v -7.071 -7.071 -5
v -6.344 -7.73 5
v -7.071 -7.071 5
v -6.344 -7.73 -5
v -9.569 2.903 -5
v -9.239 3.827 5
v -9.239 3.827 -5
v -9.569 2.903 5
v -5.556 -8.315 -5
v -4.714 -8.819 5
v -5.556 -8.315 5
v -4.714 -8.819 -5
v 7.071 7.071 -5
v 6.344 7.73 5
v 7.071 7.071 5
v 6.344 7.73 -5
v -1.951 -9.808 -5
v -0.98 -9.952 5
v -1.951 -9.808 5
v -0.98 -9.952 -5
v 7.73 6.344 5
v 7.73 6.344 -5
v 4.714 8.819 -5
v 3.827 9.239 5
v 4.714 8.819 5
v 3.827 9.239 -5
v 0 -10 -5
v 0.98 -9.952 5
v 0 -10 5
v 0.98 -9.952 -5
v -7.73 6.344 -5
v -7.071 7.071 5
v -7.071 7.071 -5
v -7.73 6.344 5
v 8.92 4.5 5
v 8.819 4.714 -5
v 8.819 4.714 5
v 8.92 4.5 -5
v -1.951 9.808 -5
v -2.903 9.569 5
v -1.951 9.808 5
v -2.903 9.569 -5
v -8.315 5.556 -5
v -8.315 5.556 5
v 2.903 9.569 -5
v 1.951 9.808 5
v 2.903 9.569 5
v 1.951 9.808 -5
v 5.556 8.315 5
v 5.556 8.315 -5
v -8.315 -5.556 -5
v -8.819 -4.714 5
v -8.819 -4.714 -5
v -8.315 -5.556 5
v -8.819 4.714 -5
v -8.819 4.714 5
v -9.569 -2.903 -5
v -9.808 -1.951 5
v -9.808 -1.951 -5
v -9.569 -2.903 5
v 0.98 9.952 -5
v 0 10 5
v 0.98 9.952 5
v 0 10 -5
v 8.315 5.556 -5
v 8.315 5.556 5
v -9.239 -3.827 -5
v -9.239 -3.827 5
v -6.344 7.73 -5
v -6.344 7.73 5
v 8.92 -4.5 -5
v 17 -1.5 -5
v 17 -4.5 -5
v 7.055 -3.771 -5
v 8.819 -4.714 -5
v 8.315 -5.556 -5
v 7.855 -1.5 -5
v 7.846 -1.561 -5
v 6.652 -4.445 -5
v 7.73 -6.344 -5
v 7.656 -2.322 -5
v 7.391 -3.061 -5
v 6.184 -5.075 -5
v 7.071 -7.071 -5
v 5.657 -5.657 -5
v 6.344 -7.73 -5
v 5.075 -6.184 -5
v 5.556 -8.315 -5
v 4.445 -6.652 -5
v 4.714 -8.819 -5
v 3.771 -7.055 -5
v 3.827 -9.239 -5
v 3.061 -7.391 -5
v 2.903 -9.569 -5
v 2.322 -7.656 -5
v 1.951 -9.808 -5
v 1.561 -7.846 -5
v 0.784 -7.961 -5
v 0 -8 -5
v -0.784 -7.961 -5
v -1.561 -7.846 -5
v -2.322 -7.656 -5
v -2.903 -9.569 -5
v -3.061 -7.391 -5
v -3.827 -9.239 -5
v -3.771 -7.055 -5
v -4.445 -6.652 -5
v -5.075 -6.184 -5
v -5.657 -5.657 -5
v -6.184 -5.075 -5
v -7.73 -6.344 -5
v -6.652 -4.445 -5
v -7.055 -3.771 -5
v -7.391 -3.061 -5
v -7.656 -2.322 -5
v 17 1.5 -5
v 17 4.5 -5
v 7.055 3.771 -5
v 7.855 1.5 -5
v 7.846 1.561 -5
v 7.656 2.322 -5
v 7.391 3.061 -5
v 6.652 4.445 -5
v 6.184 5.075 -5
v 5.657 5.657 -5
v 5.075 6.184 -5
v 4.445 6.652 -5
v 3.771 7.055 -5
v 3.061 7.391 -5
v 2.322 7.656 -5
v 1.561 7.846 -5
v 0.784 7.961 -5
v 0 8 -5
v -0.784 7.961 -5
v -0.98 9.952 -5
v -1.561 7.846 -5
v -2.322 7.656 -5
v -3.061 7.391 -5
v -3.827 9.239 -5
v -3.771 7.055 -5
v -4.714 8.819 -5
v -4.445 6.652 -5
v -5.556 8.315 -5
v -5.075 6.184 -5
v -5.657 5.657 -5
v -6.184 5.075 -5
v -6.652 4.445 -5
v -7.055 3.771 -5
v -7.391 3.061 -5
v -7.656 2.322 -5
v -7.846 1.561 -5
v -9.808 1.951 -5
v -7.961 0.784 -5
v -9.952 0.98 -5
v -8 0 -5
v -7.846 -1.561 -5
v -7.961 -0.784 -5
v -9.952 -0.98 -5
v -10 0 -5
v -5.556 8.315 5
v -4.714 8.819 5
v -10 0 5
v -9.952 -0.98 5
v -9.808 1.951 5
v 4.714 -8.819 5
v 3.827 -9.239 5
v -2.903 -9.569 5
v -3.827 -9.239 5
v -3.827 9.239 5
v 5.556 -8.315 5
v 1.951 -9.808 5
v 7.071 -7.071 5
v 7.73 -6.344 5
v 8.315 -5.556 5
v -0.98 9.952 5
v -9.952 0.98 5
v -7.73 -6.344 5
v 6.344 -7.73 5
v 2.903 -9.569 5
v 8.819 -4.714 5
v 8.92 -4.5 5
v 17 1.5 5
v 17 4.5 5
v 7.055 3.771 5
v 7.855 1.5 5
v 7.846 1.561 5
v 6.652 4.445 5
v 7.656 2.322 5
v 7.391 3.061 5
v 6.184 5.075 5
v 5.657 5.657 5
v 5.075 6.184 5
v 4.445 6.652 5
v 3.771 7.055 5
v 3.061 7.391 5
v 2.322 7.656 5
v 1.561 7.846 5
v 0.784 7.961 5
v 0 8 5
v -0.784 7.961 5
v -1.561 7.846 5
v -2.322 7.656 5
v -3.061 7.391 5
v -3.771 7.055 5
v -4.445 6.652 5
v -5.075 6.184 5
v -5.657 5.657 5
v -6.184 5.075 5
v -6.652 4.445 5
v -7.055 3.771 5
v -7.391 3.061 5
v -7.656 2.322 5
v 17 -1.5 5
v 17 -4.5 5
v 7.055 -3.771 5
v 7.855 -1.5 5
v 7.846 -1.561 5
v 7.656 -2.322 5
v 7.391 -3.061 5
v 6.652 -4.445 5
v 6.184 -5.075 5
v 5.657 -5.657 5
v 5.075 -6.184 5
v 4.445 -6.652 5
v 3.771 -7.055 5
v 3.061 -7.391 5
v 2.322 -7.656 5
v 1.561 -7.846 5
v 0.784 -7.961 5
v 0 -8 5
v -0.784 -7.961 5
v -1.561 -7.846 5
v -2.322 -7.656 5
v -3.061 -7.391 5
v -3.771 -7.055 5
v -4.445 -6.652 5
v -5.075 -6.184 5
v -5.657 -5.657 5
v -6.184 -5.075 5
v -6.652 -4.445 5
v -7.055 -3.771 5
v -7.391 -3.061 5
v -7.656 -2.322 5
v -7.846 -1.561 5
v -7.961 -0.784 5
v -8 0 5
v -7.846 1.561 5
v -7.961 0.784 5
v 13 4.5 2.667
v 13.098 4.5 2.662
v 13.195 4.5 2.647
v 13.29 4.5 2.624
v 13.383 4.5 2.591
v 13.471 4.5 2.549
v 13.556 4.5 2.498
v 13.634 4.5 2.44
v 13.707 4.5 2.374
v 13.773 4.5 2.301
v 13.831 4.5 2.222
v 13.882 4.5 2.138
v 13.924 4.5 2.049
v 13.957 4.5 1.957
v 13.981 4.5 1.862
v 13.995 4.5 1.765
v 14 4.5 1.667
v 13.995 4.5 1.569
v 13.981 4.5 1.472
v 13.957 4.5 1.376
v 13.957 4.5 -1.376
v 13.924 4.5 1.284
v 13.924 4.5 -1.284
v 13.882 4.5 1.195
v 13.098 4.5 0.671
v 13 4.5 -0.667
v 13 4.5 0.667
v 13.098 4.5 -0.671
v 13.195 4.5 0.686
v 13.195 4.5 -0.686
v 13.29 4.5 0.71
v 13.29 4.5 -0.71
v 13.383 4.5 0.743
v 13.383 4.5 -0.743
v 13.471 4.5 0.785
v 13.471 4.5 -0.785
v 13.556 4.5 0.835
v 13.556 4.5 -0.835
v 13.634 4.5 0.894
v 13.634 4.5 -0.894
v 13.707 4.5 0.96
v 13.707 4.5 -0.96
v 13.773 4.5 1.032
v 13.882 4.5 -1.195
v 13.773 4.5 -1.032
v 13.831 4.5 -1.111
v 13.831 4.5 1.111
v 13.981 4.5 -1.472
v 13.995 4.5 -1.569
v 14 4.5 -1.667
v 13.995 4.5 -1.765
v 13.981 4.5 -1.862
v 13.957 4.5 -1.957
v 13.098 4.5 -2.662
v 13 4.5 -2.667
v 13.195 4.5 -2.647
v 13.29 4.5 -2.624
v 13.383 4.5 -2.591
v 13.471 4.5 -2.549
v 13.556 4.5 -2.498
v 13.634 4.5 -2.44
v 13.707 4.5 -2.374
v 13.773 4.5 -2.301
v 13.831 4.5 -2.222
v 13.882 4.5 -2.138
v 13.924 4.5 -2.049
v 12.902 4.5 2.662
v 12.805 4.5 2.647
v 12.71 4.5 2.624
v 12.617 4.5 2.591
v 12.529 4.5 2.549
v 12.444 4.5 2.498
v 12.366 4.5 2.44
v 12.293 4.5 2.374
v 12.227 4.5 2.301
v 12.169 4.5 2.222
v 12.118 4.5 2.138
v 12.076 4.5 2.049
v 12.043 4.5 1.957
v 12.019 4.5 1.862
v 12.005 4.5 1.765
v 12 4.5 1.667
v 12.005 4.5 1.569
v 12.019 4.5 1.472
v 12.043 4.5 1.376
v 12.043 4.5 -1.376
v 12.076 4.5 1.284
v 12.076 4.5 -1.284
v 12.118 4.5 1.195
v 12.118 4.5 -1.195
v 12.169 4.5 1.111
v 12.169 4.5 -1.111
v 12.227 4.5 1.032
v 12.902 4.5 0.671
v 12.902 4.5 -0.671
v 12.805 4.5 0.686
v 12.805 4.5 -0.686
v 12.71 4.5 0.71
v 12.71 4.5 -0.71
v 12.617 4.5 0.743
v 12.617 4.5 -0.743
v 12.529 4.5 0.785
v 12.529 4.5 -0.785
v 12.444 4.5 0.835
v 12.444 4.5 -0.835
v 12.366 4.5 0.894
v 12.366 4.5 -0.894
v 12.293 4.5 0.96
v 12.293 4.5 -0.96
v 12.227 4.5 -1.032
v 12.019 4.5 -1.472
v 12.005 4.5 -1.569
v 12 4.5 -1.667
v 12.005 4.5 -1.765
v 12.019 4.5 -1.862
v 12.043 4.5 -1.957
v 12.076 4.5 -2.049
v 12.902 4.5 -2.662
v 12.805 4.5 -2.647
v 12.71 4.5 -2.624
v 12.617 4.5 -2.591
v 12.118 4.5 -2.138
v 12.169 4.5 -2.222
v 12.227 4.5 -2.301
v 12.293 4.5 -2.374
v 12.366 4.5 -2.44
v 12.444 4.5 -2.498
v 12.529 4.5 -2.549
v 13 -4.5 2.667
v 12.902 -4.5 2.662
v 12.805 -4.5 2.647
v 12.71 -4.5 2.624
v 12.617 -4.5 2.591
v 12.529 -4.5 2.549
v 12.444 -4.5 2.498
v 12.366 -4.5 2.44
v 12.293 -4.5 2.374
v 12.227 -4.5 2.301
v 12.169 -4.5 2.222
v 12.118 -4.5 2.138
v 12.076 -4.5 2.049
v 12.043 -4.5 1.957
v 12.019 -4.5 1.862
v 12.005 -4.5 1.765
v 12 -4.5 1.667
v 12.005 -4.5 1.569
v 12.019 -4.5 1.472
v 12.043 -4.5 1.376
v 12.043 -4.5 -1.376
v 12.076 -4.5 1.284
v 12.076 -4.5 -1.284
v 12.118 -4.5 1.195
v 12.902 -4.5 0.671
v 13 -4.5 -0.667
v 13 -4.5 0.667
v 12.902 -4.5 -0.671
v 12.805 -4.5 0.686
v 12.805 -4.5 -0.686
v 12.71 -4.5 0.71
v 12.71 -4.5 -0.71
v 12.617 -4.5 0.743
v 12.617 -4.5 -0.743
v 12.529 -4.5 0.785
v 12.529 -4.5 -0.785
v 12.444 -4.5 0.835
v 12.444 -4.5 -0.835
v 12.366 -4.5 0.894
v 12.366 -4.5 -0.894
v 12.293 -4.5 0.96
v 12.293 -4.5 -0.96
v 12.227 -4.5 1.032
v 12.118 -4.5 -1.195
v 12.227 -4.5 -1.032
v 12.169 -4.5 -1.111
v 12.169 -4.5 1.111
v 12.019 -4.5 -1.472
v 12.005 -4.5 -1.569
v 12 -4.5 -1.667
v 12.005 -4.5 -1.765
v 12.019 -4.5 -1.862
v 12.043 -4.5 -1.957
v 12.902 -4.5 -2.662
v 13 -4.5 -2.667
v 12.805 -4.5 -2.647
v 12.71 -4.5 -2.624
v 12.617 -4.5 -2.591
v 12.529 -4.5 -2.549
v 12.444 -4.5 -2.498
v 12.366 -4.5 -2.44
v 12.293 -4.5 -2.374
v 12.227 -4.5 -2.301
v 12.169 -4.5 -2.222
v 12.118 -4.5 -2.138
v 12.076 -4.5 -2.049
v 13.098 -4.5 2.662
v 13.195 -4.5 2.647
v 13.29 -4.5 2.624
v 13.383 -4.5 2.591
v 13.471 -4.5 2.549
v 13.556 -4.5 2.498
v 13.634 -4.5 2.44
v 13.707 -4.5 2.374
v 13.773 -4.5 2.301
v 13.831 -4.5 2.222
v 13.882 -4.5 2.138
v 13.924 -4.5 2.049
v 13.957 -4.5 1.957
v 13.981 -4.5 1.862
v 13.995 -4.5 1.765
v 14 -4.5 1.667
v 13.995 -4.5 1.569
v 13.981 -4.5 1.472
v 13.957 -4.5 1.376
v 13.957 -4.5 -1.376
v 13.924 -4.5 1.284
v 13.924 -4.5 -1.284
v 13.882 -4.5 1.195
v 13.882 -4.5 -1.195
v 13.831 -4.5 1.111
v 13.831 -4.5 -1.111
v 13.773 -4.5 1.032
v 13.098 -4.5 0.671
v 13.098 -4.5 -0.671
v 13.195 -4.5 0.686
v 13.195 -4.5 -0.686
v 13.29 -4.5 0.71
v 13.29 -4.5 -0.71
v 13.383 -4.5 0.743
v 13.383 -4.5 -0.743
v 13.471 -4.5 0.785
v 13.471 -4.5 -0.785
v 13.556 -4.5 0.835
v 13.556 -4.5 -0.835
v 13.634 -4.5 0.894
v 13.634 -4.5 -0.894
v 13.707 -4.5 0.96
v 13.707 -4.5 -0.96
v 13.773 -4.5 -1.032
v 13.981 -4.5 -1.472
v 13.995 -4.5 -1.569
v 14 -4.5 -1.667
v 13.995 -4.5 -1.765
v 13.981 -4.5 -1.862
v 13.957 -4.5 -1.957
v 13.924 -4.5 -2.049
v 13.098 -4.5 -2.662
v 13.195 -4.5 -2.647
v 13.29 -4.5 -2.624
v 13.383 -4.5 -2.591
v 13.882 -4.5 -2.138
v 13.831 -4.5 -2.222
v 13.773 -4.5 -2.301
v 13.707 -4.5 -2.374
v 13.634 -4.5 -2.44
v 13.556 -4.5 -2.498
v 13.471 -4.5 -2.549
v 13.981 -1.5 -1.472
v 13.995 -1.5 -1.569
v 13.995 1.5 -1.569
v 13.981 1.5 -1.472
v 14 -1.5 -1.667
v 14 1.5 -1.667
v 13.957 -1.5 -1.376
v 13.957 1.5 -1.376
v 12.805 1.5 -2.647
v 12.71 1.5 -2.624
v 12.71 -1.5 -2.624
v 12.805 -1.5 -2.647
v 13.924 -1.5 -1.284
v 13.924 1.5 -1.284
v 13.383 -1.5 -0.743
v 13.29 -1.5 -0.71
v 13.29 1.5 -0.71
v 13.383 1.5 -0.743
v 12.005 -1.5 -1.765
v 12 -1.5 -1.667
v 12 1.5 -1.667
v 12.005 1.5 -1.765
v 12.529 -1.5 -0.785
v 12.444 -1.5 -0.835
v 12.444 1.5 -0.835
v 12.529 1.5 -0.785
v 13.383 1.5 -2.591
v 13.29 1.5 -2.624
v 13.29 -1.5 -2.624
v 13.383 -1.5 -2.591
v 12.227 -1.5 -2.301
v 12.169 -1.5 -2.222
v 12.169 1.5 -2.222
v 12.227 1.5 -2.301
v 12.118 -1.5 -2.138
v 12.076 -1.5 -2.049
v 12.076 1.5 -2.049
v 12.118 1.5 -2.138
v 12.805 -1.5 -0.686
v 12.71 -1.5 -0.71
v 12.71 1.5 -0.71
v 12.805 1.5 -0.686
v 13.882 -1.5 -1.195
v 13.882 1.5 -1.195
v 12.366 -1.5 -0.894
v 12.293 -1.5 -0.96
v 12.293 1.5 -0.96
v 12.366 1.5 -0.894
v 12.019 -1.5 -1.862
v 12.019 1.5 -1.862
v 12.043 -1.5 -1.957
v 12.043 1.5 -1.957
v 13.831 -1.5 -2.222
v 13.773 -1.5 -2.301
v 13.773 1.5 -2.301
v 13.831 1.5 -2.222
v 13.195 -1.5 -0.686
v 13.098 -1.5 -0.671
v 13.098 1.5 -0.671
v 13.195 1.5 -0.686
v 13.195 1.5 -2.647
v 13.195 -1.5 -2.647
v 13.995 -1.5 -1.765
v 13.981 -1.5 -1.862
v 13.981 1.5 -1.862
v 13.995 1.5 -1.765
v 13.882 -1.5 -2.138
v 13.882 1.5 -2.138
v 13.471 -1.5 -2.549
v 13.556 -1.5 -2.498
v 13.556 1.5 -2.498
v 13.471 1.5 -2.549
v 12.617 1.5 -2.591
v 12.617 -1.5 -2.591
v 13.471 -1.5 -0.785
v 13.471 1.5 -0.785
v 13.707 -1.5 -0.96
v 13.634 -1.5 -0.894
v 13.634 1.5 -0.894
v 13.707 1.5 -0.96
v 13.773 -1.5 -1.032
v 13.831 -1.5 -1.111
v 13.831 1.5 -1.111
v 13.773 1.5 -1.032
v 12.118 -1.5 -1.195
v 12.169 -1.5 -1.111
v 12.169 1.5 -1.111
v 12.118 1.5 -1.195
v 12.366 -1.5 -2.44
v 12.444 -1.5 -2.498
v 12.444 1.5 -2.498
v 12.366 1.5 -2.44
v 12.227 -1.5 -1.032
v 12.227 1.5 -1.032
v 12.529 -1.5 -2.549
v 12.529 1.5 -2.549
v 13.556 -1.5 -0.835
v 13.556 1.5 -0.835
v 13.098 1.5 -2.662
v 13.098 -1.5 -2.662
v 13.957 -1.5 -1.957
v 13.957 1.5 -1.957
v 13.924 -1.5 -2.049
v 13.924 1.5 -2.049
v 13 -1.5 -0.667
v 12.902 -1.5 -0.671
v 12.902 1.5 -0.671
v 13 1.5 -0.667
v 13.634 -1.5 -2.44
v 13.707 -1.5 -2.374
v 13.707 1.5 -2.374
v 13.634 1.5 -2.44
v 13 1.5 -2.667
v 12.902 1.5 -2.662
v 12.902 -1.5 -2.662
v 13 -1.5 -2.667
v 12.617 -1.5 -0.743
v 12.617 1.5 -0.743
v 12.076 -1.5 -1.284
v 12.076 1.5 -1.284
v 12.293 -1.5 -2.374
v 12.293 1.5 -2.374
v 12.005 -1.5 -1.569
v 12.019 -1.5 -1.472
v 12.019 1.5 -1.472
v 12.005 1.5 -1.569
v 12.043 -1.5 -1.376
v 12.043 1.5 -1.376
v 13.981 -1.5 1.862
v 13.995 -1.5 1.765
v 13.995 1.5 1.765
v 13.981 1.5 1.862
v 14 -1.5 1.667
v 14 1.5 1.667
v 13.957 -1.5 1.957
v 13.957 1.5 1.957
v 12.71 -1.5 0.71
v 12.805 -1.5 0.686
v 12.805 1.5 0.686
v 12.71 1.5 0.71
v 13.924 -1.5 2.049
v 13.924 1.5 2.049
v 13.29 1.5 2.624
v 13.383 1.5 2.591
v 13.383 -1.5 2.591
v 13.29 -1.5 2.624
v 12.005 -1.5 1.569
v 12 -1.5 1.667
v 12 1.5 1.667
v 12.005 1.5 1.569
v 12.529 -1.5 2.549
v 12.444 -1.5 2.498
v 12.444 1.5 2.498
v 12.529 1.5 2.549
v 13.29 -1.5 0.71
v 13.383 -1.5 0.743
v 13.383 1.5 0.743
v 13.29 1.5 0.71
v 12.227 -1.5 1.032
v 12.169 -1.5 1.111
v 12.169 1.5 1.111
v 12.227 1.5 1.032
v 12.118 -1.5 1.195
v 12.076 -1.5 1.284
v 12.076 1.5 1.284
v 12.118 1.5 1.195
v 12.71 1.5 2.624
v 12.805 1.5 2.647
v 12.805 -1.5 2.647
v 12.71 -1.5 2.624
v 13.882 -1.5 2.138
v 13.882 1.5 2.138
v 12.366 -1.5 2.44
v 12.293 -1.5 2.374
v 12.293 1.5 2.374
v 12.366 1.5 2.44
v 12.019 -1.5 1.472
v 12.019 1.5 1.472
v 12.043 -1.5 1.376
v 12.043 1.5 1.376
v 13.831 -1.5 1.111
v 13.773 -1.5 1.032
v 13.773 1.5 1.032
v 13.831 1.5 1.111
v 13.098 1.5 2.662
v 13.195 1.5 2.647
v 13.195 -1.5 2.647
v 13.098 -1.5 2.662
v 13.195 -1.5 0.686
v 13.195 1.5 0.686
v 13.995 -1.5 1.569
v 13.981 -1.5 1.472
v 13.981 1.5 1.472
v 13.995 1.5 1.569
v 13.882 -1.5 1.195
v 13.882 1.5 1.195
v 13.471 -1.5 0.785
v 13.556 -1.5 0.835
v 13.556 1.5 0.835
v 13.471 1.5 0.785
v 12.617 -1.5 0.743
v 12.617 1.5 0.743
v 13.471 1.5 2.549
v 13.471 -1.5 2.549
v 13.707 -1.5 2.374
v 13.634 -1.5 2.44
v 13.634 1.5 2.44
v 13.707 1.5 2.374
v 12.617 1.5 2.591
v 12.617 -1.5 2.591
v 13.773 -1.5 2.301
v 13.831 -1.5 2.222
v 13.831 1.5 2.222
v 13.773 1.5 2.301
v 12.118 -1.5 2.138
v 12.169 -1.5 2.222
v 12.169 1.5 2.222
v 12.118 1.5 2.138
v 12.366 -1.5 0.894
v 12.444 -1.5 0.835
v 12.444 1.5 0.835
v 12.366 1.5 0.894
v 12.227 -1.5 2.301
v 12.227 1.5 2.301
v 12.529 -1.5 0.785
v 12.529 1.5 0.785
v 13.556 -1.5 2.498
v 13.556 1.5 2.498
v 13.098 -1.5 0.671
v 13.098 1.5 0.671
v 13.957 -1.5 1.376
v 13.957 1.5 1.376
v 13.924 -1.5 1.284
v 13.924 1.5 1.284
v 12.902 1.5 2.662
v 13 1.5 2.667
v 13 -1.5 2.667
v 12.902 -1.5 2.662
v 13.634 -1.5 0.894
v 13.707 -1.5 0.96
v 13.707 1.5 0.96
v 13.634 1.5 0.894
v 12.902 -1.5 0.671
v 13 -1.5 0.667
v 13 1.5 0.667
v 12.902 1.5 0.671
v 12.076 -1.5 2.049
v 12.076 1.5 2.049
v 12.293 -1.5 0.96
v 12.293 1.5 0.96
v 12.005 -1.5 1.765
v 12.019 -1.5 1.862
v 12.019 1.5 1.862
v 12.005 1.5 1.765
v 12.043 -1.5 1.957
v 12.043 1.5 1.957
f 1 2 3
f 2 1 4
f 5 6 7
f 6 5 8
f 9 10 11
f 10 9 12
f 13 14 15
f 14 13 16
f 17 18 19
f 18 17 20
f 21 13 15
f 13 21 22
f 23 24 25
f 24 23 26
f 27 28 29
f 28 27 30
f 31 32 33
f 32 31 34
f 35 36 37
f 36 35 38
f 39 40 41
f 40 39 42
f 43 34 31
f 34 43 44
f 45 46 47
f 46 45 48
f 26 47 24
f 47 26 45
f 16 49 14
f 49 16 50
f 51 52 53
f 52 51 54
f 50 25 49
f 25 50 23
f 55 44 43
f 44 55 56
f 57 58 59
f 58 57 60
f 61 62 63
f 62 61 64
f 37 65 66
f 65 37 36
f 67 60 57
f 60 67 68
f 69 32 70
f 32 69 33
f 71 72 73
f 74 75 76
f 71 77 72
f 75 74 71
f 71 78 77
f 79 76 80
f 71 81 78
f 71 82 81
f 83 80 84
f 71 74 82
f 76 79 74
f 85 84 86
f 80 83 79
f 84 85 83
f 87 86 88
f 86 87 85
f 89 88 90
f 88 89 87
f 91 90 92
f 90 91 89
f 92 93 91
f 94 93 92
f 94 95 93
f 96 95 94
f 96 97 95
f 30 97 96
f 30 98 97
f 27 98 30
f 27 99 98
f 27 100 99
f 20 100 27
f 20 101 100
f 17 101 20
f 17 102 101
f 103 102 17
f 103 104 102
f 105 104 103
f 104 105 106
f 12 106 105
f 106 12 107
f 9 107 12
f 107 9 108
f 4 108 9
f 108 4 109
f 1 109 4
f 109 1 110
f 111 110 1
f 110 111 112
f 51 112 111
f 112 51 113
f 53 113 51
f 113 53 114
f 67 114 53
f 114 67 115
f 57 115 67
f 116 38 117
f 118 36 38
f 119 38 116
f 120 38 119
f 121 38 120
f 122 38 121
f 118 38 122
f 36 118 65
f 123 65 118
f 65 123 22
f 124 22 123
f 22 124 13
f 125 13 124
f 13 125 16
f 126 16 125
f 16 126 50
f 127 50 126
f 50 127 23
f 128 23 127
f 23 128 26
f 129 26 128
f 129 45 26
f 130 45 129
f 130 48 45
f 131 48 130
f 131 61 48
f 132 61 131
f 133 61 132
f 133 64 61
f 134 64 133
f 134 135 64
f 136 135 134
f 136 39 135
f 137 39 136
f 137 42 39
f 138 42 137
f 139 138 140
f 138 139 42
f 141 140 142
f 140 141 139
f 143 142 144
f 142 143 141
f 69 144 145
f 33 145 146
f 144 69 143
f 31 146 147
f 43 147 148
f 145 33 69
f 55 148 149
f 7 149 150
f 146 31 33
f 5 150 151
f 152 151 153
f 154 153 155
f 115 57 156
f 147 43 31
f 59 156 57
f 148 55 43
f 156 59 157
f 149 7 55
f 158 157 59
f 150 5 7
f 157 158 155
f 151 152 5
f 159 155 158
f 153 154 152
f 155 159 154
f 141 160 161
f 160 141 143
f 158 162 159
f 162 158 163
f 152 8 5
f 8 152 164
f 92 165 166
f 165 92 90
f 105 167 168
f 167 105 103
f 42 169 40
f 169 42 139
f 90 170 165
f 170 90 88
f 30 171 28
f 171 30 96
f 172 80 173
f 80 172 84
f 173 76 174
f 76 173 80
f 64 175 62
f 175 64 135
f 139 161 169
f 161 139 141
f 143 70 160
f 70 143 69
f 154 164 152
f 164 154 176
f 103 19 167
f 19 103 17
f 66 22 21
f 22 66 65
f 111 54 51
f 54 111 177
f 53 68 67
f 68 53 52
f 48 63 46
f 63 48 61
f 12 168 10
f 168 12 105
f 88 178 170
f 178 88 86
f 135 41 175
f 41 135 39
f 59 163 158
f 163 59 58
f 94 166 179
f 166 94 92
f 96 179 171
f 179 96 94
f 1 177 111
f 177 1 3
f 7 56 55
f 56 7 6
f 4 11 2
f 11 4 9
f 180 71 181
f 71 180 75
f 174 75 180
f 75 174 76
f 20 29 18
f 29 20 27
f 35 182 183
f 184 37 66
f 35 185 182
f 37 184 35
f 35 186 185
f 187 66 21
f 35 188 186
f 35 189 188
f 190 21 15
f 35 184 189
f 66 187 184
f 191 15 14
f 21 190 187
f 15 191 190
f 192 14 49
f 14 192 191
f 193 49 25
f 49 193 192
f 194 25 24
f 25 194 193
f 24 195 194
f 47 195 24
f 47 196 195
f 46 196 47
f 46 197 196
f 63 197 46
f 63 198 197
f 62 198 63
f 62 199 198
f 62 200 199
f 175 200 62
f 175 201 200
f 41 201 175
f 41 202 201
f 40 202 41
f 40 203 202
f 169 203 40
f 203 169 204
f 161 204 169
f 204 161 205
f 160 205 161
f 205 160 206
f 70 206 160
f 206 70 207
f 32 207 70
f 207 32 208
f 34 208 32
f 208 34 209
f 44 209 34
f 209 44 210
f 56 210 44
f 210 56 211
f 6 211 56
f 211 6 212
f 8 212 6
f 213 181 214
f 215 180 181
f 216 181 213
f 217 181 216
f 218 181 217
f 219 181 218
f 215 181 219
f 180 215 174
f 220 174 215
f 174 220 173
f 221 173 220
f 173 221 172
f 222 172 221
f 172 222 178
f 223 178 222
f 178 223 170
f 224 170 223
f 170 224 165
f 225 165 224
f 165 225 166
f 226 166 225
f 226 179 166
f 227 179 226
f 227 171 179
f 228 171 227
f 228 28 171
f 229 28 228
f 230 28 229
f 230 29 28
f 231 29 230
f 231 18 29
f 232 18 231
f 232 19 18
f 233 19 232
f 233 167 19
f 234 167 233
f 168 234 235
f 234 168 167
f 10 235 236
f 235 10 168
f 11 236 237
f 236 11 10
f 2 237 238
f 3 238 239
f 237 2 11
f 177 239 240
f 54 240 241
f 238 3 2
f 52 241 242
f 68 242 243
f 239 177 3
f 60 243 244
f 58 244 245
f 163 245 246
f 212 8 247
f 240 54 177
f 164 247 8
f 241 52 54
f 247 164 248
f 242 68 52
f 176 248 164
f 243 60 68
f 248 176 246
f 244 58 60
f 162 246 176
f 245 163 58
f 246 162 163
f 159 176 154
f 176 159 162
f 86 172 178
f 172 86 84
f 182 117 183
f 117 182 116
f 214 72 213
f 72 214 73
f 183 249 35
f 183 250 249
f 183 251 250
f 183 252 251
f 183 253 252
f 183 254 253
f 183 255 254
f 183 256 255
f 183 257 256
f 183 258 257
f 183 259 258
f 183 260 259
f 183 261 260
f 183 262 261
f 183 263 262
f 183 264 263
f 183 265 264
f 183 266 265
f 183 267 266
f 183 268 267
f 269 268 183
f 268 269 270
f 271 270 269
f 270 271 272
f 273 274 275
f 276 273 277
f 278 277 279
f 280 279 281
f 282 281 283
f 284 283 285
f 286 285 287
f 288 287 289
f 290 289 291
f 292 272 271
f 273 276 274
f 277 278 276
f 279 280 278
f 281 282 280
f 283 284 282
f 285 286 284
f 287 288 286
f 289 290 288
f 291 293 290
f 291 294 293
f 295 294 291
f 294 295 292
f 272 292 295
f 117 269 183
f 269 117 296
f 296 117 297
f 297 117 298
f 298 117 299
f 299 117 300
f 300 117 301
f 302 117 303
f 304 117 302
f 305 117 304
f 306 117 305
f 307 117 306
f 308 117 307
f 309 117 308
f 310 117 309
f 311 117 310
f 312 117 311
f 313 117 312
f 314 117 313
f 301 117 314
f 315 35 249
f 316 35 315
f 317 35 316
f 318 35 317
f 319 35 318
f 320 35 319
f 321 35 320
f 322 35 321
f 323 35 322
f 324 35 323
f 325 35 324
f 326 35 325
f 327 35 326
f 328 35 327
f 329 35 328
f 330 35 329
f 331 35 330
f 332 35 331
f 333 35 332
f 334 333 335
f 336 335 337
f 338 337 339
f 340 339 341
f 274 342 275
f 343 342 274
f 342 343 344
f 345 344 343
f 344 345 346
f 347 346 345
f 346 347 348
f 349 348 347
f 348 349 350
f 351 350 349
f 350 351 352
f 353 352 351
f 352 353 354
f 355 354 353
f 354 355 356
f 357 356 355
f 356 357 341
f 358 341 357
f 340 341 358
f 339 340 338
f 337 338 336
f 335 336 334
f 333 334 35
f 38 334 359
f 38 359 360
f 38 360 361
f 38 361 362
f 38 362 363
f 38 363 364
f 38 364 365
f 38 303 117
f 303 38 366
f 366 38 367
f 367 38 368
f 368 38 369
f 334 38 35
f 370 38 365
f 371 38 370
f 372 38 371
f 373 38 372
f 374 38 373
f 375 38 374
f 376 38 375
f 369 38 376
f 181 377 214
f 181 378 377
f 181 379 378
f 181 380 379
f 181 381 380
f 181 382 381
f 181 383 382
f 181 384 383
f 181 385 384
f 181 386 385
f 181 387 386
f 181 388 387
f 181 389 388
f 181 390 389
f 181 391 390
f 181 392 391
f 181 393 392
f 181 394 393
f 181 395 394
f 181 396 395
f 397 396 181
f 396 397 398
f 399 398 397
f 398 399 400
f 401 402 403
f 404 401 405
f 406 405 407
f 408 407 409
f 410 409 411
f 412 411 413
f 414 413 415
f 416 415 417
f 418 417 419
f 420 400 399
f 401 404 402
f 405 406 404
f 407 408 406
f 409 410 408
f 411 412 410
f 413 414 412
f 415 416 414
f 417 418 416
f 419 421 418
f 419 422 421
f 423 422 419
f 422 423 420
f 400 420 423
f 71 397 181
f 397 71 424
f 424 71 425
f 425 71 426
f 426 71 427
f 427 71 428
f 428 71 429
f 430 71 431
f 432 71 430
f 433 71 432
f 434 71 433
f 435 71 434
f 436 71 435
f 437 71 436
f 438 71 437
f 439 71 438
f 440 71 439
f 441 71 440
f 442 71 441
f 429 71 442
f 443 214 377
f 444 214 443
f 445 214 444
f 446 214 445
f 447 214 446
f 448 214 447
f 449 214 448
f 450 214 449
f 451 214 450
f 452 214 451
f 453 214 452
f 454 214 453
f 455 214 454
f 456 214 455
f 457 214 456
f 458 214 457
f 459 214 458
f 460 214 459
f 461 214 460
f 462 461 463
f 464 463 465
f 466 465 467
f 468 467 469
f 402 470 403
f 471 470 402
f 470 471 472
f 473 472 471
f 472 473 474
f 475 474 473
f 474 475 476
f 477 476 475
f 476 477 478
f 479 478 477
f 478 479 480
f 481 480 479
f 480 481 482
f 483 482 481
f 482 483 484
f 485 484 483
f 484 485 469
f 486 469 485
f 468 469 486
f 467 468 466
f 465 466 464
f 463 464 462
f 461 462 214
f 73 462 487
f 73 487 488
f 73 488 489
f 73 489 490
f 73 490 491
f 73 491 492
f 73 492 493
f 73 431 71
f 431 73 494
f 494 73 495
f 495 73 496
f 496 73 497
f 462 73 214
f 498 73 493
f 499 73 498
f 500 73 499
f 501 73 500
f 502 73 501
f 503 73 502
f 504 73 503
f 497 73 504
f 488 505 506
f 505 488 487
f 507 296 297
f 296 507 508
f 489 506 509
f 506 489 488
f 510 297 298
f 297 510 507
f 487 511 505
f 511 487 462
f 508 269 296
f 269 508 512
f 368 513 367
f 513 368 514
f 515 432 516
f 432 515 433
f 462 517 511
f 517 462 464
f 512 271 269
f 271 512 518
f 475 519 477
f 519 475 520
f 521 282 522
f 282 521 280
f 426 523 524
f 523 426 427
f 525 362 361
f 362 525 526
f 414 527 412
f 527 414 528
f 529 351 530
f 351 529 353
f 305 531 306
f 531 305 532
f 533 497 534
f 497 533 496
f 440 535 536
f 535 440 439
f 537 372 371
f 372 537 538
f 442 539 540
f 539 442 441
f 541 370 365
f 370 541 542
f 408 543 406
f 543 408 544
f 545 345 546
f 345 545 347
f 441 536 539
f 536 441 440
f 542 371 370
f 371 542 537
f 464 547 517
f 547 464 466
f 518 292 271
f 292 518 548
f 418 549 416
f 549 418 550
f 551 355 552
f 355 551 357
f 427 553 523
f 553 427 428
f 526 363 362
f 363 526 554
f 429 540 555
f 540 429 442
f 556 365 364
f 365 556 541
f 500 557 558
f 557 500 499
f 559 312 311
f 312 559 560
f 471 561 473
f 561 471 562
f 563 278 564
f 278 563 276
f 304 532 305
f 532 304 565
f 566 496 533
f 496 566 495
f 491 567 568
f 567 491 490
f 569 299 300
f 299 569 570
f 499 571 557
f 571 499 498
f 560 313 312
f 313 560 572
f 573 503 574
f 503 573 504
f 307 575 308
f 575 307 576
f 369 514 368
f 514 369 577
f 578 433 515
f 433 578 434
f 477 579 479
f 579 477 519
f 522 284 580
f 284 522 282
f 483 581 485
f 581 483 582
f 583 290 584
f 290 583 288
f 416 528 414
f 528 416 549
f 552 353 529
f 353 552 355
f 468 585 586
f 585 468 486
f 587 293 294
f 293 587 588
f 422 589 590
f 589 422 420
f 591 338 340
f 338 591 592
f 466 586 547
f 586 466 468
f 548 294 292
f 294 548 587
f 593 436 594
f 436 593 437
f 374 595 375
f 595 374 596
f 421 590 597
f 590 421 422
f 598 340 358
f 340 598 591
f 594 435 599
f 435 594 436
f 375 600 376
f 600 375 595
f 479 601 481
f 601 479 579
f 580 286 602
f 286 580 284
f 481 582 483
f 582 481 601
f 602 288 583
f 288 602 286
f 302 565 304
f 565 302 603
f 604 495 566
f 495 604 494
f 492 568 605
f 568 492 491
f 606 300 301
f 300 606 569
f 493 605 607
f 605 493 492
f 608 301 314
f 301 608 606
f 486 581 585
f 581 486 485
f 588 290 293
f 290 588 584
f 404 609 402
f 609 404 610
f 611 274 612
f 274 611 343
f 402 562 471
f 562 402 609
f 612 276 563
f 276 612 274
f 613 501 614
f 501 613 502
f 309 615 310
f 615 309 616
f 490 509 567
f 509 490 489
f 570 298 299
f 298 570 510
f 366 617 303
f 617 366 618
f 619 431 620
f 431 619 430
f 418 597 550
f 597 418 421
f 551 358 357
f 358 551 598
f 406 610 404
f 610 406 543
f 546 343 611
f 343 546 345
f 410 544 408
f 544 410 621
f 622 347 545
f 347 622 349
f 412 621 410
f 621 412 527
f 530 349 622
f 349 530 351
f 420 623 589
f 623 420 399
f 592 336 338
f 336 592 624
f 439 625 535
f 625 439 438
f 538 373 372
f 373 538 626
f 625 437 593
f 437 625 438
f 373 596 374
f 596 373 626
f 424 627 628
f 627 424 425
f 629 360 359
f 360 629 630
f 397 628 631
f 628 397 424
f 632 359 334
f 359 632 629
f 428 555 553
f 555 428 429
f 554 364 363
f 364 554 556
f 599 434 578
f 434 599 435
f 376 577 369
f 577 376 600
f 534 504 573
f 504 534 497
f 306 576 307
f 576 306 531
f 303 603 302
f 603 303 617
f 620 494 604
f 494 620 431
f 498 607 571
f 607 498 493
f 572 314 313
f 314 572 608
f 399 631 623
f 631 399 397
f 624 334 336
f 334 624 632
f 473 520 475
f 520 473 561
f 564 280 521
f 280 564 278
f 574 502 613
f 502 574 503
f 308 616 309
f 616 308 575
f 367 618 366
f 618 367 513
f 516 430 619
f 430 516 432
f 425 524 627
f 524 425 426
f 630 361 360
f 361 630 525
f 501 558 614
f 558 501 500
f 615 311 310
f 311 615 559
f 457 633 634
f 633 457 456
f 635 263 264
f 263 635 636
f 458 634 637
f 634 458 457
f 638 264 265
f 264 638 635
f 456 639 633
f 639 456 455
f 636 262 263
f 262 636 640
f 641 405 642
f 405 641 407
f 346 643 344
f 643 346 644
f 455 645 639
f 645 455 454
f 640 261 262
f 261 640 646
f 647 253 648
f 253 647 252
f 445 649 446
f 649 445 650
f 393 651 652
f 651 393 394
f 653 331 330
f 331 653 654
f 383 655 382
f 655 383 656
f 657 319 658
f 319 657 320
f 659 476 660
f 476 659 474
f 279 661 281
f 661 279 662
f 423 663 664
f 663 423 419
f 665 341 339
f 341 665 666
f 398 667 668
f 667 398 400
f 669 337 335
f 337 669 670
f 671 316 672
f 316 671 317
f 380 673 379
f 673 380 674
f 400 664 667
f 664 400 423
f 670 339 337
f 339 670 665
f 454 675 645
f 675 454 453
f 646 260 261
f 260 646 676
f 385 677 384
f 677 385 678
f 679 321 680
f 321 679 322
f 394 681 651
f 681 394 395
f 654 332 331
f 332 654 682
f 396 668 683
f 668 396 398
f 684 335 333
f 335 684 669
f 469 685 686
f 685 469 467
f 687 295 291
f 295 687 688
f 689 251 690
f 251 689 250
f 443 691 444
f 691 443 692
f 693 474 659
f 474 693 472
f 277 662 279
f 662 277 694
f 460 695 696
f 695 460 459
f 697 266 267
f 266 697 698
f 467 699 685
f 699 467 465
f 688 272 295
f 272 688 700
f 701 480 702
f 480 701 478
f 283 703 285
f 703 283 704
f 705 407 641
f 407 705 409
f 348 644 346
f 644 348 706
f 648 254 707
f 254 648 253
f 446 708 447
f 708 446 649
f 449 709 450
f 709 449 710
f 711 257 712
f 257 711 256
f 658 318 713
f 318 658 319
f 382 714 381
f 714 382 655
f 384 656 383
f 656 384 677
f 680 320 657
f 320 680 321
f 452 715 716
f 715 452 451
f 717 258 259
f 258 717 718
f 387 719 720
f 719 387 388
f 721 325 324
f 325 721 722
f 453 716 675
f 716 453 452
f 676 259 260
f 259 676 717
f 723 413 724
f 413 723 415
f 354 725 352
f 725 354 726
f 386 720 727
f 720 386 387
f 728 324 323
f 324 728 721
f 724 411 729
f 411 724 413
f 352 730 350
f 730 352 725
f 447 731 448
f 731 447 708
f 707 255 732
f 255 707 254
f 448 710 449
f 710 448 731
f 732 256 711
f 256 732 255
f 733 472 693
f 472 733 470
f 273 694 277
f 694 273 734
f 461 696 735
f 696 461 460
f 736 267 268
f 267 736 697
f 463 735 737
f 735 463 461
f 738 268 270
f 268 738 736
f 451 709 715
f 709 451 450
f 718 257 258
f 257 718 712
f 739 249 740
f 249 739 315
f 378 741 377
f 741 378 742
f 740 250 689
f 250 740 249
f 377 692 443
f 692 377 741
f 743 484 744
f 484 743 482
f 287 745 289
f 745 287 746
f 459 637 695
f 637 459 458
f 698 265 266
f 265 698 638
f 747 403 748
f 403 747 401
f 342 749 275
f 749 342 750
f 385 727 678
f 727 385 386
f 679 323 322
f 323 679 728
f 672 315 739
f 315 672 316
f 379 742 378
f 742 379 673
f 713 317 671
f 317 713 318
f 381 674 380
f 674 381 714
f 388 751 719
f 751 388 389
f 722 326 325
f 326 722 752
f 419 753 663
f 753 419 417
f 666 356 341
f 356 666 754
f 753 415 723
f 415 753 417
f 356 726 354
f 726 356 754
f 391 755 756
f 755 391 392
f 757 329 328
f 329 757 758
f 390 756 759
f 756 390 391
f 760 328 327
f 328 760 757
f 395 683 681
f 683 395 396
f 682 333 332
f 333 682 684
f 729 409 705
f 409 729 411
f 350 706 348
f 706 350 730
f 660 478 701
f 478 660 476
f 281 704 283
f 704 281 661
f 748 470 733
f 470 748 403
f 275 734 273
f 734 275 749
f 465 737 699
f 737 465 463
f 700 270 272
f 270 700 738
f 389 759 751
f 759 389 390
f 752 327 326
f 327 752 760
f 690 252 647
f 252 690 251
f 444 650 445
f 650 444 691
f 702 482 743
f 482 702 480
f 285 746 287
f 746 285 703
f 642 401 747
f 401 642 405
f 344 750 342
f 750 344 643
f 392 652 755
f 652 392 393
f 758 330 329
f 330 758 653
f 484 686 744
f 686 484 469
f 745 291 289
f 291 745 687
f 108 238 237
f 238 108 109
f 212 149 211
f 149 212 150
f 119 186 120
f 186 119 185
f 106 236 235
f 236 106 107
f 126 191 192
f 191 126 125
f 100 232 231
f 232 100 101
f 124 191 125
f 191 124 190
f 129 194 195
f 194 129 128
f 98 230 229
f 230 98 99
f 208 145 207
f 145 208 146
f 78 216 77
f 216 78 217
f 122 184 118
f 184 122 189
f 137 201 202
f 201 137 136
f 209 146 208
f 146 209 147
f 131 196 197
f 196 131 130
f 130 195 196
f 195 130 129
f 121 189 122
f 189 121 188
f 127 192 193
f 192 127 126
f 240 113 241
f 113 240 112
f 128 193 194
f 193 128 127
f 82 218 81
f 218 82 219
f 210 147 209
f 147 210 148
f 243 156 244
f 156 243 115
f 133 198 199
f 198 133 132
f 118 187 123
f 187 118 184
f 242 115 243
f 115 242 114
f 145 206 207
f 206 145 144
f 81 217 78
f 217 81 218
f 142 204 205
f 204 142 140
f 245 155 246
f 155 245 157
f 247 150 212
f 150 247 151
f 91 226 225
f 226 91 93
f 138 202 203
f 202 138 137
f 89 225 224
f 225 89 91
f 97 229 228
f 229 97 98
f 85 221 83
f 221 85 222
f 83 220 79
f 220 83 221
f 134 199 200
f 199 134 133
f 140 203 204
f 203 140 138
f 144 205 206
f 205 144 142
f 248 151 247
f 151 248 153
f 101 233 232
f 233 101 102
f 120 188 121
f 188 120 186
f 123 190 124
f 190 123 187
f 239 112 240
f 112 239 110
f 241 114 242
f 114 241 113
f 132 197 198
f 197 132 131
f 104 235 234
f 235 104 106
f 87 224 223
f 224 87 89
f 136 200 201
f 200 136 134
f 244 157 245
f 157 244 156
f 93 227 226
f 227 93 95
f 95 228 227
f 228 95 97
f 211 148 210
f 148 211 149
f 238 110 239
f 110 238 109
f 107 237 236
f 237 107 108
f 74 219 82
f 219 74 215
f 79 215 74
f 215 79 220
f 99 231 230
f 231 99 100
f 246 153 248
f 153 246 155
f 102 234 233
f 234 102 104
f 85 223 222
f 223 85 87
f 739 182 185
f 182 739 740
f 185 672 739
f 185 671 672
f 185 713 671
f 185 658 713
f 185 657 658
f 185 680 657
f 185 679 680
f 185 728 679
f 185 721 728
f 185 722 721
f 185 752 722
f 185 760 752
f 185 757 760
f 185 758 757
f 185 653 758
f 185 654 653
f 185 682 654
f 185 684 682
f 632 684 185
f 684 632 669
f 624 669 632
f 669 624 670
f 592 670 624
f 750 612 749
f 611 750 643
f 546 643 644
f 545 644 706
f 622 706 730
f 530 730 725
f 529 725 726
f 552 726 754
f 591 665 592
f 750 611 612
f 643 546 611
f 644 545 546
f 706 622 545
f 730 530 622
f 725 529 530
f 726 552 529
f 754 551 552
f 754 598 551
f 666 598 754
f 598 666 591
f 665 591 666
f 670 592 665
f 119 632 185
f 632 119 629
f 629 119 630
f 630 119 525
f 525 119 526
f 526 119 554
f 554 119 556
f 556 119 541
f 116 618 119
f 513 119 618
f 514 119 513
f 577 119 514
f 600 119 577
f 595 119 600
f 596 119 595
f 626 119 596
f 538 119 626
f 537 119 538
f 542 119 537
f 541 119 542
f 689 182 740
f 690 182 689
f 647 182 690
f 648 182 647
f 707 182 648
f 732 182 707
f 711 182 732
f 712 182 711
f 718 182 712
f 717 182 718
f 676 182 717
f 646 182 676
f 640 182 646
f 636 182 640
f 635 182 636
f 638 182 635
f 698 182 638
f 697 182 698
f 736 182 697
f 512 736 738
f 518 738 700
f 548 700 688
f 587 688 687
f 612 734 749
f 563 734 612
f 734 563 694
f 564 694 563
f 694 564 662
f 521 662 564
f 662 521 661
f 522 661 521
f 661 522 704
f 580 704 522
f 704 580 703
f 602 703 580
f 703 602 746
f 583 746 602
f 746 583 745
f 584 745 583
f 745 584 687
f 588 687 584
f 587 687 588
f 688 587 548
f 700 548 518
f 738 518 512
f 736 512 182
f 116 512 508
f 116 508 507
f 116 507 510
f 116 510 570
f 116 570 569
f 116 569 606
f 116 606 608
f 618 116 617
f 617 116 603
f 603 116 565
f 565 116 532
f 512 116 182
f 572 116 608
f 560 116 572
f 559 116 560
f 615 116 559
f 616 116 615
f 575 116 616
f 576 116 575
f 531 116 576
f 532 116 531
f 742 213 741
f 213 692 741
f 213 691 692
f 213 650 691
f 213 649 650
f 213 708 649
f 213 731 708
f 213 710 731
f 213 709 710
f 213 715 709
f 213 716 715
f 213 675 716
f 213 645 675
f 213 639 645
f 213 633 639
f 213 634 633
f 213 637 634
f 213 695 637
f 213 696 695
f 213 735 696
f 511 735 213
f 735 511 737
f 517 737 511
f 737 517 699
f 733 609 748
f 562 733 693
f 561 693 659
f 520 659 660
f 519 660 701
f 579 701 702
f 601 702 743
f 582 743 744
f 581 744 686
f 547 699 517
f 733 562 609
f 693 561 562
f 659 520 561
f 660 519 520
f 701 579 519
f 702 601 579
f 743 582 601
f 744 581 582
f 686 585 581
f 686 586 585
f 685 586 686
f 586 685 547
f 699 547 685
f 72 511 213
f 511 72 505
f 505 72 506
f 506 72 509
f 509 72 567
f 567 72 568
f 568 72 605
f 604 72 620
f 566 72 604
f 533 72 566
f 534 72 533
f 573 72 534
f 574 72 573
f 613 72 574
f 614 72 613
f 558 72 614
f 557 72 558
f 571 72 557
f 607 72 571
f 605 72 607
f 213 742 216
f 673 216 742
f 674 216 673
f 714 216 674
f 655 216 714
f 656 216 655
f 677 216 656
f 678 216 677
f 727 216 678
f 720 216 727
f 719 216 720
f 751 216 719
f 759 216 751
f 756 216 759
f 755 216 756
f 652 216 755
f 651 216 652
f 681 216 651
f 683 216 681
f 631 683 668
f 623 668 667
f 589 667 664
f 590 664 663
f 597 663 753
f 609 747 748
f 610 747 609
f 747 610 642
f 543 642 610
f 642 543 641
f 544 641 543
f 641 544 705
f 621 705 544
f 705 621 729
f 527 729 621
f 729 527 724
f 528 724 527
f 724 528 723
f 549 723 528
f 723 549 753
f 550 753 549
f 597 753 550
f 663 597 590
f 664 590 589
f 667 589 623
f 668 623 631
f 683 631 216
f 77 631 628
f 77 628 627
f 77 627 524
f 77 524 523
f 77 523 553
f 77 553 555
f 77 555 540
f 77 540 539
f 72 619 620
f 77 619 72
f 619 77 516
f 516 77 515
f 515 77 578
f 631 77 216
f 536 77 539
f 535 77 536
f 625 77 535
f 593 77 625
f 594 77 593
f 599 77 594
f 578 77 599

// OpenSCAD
// file: base.scad
// Base function and modules for all cases

// Create [x, y, z] copies of the object 
// placed according to the step vector
module array(n_copies, step = [10,10,10], center = true)
{
    translation = (center) ? [for(i = [0:2])
            (n_copies[i] - 1) * step[i] / -2] : [0, 0, 0];
    translate(translation)
    union() {
        for (i_x = [0:n_copies[0] - 1]) {
            for (i_y = [0:n_copies[1] - 1]) {
                for (i_z = [0:n_copies[2] - 1]) {
                    translate([i_x*step[0], i_y*step[1], 
                        i_z*step[2]]) children();
                }
            }
        }
    }
}

module mirrorcp(arg) {
    children();
    mirror(arg) children();
}

module rotatecp(arg) {
    children();
    rotate(arg) children();
}

module placeclone(points) {
    union() {
        for (p = points) {
            translate(p) children();
        }
    } 
}

// cylinder with ellipse profile
module ellipse_cylinder(h = 1, rx = 1, ry = 1)
{
    scale([rx, ry, h]) cylinder(h = 1, r = 1, center = true);
}

// rectangular triangle
module rect_triangle(x = 1, y = 1)
{
    polygon(points = [[x, 0], [0, 0], [0, y]]);
}

// isosceles triangle
// set two out of three parameters
module iso_triangle(base = undef, height = undef, angle = undef)
{
    b = (base > 0) ? base : 2 * height / tan(angle);
    h = (height > 0) ? height : base * tan(angle) / 2;
    a = (angle > 0) ? angle : atan2(h, b/2);
    polygon(points = [[-b/2, 0], [0, h], [b/2, 0]]); 
}

// hexagon. Width for nut wrench.
module hexagon(width)
{
    size = width / sqrt(3);
    polygon(points = [for(a = [0:60:360]) [size*cos(a+30), size*sin(a+30)]]);
}

// octogon. Width - from rib to rib
module octogon(width)
{
    size = 0.5 * width / cos(45/2);
    polygon(points = [for(a = [0:45:360]) [size*cos(a+45/2), size*sin(a+45/2)]]);
}

// torus(outer_d, inner_d)
module torus(outer_d, inner_d, convexity = 10)
{
    rotate_extrude(convexity = convexity)
    translate([outer_d/2, 0, 0])
    circle(d = inner_d);
}

// isosceles trapezium
// set three out of four parameters
module iso_trapezium(bottom = undef, top = undef, height = undef, angle = undef)
{
    b = (bottom > 0) ? bottom : top + 2 * height / tan(angle);
    t = (top > 0) ? top : bottom - 2 * height / tan(angle);
    h = (height > 0) ? height : abs(bottom - top) * tan(angle) / 2;
    a = (angle > 0) ? angle : atan2(h, abs(bottom - top) / 2);
    polygon(points = [[-b/2, 0], [-t/2, h], [t/2, h], [b/2, 0]]);
}

// create prism from polygon
module prism(h = 1, center = true)
{
    linear_extrude(height = h, center = center, scale = 1.0)
    {
        children();
    }
}


// rectangular triangle prism
// size = [x, y, z] - 2 legs and depth
// dir - direction of normal to triangle plane
module rect_triangle_prism(size = [1, 1, 1])
{
    linear_extrude(height = size[2], center = true, scale = 1.0)
    {
        rect_triangle(x = size[0], y = size[1]);
    }
}

// Circular plane sector
// angle > 0!
module sector2d(diameter, angle)
{
    support_point = (angle < 90) ? [0, 2*diameter] :
                    (angle < 270) ? [-2*diameter, 0] :
                    [0, -2*diameter];
    difference() {
        circle(d=diameter);
        polygon(points = [[0, 0], [2*diameter, 0], [2*diameter, -3*diameter], 
            [-4*diameter, -3*diameter], support_point,
            [diameter*cos(angle), diameter*sin(angle)]]);
        
    }
}

// Bow - base on sector2d
// Pos - bow position related to diameter. Can be "o" = outer, "i" = inner, "c" = center
module bow2d(diameter, angle, width, pos = "c")
{
    d_offset = (pos == "o") ? width : (pos == "i") ? -width : 0;
    d1 = diameter + width + d_offset;
    d2 = d1 - 2*width;
    difference() {
        sector2d(d1, angle);
        sector2d(d2, 360);
    }
}

// Bow - bow2d by two points - beginning and ending of bow.
// Pos - bow position related to points. Can be "o" = outer, "i" = inner, "c" = center
// Use switch to choose another bow part
module bow2d2p(point_begin, point_end, bow_r, width, switch = true, pos = "c", ext_angle = 0)
{
    dx = point_begin[0];
    dy = point_end[1];
    circle_center = [circle_center_x(point_end[0] - dx, point_begin[1] - dy, bow_r), circle_center_y(point_end[0] - dx, point_begin[1] - dy, bow_r)] + [dx, dy];
    az_begin = vector_az2d(point_begin - circle_center);
    az_end = vector_az2d(point_end - circle_center);
    az1 = (switch) ? min(az_begin, az_end) : max(az_begin, az_end);
    az2 = (switch) ? max(az_begin, az_end) : min(az_begin, az_end);
    bow_a = (az2 > az1) ? az2-az1: 360 + (az2 - az1);
    echo(az1 = az1); echo(dx = dx); echo(dy = dy);
    echo(az2 = az2); echo(az_begin = az_begin); echo(az_end = az_end);
    echo(circle_center = circle_center);

    translate([circle_center[0], circle_center[1], 0])
    rotate([0, 0, az1 - ext_angle])
    bow2d(abs(bow_r)*2, bow_a + 2*ext_angle, width, pos);
}

function vector_az2d(v) = atan2(v[1], v[0]);

function rotate_vector(a, v)
    = [[1,0,0],[0,cos(a[0]),-sin(a[0])],[0,sin(a[0]),cos(a[0])]]
    * [[cos(a[1]),0,sin(a[1])],[0,1,0],[-sin(a[1]),0,cos(a[1])]]
    * [[cos(a[2]),-sin(a[2]),0],[sin(a[2]),cos(a[2]),0],[0,0,1]] * v;

function circle_center_root(x, y, r) = sign(r) * sqrt(pow(r,2) / (pow(y,2) + pow(x,2)) - 0.25);
function circle_center_x(x, y, r) = y * circle_center_root(x, y, r) + x/2;
function circle_center_y(x, y, r) = x * circle_center_root(x, y, r) + y/2;


module bevel_cube(cube_vec, bevel)
{
    intersection() {
        intersection() {
            intersection() {
                cube(cube_vec, center = true);
                scale([1, cube_vec[1]/cube_vec[0],1])
                cylinder(d=cube_vec[0]*sqrt(2)-bevel*2, h = cube_vec[2]+1,center=true);
            }
            rotate([90,0,0])
            scale([1, cube_vec[2]/cube_vec[0],1])
            cylinder(d=cube_vec[0]*sqrt(2)-bevel*2, h = cube_vec[1]+1,center=true);
        }
        rotate([0,90,0])
        scale([1, cube_vec[2]/cube_vec[1],1])
        cylinder(d=cube_vec[1]*sqrt(2)-bevel*2, h = cube_vec[0]+1,center=true);
    }
}
// main file
// For mechanics only
use <base.scad>;

// Fish top with stem. Angle must be between 0 and 90.
// Female fish top - is a difference(cube, male)
// Stem - for male, Shell - for female
// Shell = [side(X), back(Y)] or scalar
module fishtop(gender = "m", size = 1, depth = 1, 
    angle = 45, length = 1, backlash = 0, stem = 0, shell = 1)
{
    if (angle >= 90 || angle <= 0) echo("Fish top: Wrong angle!");
    if (gender == "m") {
        real_size = size + 2*backlash;
        real_depth = depth + backlash;
        minor_size = size - 2*depth/tan(angle) + 2*backlash;
        union() {
            linear_extrude(height = length, center = true, scale = 1.0)
            {
                polygon(points = [[-real_size/2, backlash],
                    [-real_size/2, 0], [real_size/2, 0],
                    [real_size/2, backlash],
                    [minor_size/2, real_depth], 
                    [-minor_size/2, real_depth]]);
            }
            translate([0, real_depth + stem / 2 - 0.01, 0]) 
                cube([minor_size, stem, length], center = true);
        }
        
    } else {
        side_shell = (len(shell) > 1) ? shell[0] : shell;
        back_shell = (len(shell) > 1) ? shell[1] : shell;
        difference() {
            translate([0, depth/2 - back_shell/2, 0])
                cube([size + 2 * side_shell, 
                    depth + back_shell, length], 
                    center = true);
            fishtop(gender = "m", size = size, depth = depth, 
                angle = angle, length = length + 0.01, 
                backlash = backlash, stem = 0.1);
        }
    }
}

// Box
// You must set any two parameters. Thrid parameter is redundant.
// External, internal and shell must be a vectors.
// shell[2] (Z) - is a bottom width
module box(external = 0, internal = 0, shell = 0)
{
    ext_size = (external) ? external : internal + 
        [shell[0]*2, shell[1]*2, shell[2]];
    int_size = (internal) ? internal : external - 
        [shell[0]*2, shell[1]*2, shell[2]];
    shell_size = (shell) ? shell : 
        [(external[0] - internal[0]) / 2,
         (external[1] - internal[1]) / 2,
         external[2] - internal[2]];
    difference(){
        cube(ext_size, center = true);
        translate([0, 0, shell_size[2]/2 + 0.01])
            cube(int_size + [0, 0, 0.02], center = true);
    }
}

// Stuff for bolt and nut mount. Add it in difference
// Required parameters: l - full bolt length. d - bolt diameter, 
// Additional parameters: depth - hat and nut depth, hex - nut width, hat_d - botl hat diameter
module bolt_nut_mount(l = 10, d = 3, depth = 0, hex = 0, hat_d = 0)
{
    hat_depth = (depth == 0) ? d : depth;
    hex_depth = (depth == 0) ? d : depth;
    bolt_hat_d = (hat_d == 0) ? 2*d : hat_d;
    hex_w = (hex == 0) ? (1.7 + 5.4 / pow(d, 3)) * d : hex;
    union() {
        cylinder(d = d, h = l, center = true);
        translate([0, 0, l/2 - hat_depth/2]) cylinder(d = bolt_hat_d, h = hat_depth, center = true);
        translate([0, 0, -l/2 + hat_depth/2]) prism(h = hex_depth) hexagon(hex_w);
    }
}


// Pipe
module pipe(outer_diameter, inner_diameter, length, resolution = 0.1)
{
    $fs = resolution;
    difference() {
        cylinder(h = length, r = outer_diameter / 2, 
            center = true);
        cylinder(h = length + 0.01, r = inner_diameter / 2, 
            center = true);
    }
}

// Holder for cylinder
// n_holes - number of holes - can be scalar or [x_holes, z_holes]
module pipe_collar(cylinder_d = 10, holder_d = 5, holder_h = 10, 
    gap = 1, clamp_l = 1, clamp_w = 1, n_holes = 0, hole_d = 3, bolt_places = false)
{
    holder_shell = (holder_d - cylinder_d)/2;
    clamp_full_l = clamp_l + holder_d/2;
    hole_points_z = (len(n_holes) == undef) ? 
        [-holder_h * (n_holes/(n_holes + 1) - 1/2):
         holder_h/(n_holes + 1):
         holder_h * (n_holes/(n_holes + 1) - 1/2) + 0.01] : 
        [holder_h/2 - hole_d, -holder_h/2 + hole_d];
    difference() {
        union() {
            cylinder(r = holder_d/2, h = holder_h, center = true);
            // clamp
            translate([clamp_full_l/2, 0, 0])
                cube([clamp_full_l, clamp_w*2 + gap, holder_h], 
                    center = true);
        }
        union() {
            cylinder(r = cylinder_d/2, h = holder_h + 0.01, 
                center = true);
            // gap
            translate([holder_d/2 - (holder_shell - clamp_l)/2, 0, 0]) 
                cube([clamp_l + holder_d/2 + 0.01, gap, 
                    holder_h + 0.01], center = true);
            // holes
            for (z = hole_points_z) {
                translate([cylinder_d/2 + clamp_l/2 + holder_shell*3/4, 0, z]) 
                rotate([90, 0, 0])
                if (bolt_places) {
                    bolt_nut_mount(l = clamp_w*2 + gap + 0.01, d = hole_d);
                } else {
                    cylinder(r = hole_d/2, h = clamp_w*2 + gap + 0.01, 
                        center = true);
                }
            }
        }
    }
}

$fn = 64;
pipe_collar(cylinder_d = 16, holder_d = 20, holder_h = 10, gap = 3,
    clamp_l = 7, clamp_w = 3, n_holes = 2, hole_d = 2);
